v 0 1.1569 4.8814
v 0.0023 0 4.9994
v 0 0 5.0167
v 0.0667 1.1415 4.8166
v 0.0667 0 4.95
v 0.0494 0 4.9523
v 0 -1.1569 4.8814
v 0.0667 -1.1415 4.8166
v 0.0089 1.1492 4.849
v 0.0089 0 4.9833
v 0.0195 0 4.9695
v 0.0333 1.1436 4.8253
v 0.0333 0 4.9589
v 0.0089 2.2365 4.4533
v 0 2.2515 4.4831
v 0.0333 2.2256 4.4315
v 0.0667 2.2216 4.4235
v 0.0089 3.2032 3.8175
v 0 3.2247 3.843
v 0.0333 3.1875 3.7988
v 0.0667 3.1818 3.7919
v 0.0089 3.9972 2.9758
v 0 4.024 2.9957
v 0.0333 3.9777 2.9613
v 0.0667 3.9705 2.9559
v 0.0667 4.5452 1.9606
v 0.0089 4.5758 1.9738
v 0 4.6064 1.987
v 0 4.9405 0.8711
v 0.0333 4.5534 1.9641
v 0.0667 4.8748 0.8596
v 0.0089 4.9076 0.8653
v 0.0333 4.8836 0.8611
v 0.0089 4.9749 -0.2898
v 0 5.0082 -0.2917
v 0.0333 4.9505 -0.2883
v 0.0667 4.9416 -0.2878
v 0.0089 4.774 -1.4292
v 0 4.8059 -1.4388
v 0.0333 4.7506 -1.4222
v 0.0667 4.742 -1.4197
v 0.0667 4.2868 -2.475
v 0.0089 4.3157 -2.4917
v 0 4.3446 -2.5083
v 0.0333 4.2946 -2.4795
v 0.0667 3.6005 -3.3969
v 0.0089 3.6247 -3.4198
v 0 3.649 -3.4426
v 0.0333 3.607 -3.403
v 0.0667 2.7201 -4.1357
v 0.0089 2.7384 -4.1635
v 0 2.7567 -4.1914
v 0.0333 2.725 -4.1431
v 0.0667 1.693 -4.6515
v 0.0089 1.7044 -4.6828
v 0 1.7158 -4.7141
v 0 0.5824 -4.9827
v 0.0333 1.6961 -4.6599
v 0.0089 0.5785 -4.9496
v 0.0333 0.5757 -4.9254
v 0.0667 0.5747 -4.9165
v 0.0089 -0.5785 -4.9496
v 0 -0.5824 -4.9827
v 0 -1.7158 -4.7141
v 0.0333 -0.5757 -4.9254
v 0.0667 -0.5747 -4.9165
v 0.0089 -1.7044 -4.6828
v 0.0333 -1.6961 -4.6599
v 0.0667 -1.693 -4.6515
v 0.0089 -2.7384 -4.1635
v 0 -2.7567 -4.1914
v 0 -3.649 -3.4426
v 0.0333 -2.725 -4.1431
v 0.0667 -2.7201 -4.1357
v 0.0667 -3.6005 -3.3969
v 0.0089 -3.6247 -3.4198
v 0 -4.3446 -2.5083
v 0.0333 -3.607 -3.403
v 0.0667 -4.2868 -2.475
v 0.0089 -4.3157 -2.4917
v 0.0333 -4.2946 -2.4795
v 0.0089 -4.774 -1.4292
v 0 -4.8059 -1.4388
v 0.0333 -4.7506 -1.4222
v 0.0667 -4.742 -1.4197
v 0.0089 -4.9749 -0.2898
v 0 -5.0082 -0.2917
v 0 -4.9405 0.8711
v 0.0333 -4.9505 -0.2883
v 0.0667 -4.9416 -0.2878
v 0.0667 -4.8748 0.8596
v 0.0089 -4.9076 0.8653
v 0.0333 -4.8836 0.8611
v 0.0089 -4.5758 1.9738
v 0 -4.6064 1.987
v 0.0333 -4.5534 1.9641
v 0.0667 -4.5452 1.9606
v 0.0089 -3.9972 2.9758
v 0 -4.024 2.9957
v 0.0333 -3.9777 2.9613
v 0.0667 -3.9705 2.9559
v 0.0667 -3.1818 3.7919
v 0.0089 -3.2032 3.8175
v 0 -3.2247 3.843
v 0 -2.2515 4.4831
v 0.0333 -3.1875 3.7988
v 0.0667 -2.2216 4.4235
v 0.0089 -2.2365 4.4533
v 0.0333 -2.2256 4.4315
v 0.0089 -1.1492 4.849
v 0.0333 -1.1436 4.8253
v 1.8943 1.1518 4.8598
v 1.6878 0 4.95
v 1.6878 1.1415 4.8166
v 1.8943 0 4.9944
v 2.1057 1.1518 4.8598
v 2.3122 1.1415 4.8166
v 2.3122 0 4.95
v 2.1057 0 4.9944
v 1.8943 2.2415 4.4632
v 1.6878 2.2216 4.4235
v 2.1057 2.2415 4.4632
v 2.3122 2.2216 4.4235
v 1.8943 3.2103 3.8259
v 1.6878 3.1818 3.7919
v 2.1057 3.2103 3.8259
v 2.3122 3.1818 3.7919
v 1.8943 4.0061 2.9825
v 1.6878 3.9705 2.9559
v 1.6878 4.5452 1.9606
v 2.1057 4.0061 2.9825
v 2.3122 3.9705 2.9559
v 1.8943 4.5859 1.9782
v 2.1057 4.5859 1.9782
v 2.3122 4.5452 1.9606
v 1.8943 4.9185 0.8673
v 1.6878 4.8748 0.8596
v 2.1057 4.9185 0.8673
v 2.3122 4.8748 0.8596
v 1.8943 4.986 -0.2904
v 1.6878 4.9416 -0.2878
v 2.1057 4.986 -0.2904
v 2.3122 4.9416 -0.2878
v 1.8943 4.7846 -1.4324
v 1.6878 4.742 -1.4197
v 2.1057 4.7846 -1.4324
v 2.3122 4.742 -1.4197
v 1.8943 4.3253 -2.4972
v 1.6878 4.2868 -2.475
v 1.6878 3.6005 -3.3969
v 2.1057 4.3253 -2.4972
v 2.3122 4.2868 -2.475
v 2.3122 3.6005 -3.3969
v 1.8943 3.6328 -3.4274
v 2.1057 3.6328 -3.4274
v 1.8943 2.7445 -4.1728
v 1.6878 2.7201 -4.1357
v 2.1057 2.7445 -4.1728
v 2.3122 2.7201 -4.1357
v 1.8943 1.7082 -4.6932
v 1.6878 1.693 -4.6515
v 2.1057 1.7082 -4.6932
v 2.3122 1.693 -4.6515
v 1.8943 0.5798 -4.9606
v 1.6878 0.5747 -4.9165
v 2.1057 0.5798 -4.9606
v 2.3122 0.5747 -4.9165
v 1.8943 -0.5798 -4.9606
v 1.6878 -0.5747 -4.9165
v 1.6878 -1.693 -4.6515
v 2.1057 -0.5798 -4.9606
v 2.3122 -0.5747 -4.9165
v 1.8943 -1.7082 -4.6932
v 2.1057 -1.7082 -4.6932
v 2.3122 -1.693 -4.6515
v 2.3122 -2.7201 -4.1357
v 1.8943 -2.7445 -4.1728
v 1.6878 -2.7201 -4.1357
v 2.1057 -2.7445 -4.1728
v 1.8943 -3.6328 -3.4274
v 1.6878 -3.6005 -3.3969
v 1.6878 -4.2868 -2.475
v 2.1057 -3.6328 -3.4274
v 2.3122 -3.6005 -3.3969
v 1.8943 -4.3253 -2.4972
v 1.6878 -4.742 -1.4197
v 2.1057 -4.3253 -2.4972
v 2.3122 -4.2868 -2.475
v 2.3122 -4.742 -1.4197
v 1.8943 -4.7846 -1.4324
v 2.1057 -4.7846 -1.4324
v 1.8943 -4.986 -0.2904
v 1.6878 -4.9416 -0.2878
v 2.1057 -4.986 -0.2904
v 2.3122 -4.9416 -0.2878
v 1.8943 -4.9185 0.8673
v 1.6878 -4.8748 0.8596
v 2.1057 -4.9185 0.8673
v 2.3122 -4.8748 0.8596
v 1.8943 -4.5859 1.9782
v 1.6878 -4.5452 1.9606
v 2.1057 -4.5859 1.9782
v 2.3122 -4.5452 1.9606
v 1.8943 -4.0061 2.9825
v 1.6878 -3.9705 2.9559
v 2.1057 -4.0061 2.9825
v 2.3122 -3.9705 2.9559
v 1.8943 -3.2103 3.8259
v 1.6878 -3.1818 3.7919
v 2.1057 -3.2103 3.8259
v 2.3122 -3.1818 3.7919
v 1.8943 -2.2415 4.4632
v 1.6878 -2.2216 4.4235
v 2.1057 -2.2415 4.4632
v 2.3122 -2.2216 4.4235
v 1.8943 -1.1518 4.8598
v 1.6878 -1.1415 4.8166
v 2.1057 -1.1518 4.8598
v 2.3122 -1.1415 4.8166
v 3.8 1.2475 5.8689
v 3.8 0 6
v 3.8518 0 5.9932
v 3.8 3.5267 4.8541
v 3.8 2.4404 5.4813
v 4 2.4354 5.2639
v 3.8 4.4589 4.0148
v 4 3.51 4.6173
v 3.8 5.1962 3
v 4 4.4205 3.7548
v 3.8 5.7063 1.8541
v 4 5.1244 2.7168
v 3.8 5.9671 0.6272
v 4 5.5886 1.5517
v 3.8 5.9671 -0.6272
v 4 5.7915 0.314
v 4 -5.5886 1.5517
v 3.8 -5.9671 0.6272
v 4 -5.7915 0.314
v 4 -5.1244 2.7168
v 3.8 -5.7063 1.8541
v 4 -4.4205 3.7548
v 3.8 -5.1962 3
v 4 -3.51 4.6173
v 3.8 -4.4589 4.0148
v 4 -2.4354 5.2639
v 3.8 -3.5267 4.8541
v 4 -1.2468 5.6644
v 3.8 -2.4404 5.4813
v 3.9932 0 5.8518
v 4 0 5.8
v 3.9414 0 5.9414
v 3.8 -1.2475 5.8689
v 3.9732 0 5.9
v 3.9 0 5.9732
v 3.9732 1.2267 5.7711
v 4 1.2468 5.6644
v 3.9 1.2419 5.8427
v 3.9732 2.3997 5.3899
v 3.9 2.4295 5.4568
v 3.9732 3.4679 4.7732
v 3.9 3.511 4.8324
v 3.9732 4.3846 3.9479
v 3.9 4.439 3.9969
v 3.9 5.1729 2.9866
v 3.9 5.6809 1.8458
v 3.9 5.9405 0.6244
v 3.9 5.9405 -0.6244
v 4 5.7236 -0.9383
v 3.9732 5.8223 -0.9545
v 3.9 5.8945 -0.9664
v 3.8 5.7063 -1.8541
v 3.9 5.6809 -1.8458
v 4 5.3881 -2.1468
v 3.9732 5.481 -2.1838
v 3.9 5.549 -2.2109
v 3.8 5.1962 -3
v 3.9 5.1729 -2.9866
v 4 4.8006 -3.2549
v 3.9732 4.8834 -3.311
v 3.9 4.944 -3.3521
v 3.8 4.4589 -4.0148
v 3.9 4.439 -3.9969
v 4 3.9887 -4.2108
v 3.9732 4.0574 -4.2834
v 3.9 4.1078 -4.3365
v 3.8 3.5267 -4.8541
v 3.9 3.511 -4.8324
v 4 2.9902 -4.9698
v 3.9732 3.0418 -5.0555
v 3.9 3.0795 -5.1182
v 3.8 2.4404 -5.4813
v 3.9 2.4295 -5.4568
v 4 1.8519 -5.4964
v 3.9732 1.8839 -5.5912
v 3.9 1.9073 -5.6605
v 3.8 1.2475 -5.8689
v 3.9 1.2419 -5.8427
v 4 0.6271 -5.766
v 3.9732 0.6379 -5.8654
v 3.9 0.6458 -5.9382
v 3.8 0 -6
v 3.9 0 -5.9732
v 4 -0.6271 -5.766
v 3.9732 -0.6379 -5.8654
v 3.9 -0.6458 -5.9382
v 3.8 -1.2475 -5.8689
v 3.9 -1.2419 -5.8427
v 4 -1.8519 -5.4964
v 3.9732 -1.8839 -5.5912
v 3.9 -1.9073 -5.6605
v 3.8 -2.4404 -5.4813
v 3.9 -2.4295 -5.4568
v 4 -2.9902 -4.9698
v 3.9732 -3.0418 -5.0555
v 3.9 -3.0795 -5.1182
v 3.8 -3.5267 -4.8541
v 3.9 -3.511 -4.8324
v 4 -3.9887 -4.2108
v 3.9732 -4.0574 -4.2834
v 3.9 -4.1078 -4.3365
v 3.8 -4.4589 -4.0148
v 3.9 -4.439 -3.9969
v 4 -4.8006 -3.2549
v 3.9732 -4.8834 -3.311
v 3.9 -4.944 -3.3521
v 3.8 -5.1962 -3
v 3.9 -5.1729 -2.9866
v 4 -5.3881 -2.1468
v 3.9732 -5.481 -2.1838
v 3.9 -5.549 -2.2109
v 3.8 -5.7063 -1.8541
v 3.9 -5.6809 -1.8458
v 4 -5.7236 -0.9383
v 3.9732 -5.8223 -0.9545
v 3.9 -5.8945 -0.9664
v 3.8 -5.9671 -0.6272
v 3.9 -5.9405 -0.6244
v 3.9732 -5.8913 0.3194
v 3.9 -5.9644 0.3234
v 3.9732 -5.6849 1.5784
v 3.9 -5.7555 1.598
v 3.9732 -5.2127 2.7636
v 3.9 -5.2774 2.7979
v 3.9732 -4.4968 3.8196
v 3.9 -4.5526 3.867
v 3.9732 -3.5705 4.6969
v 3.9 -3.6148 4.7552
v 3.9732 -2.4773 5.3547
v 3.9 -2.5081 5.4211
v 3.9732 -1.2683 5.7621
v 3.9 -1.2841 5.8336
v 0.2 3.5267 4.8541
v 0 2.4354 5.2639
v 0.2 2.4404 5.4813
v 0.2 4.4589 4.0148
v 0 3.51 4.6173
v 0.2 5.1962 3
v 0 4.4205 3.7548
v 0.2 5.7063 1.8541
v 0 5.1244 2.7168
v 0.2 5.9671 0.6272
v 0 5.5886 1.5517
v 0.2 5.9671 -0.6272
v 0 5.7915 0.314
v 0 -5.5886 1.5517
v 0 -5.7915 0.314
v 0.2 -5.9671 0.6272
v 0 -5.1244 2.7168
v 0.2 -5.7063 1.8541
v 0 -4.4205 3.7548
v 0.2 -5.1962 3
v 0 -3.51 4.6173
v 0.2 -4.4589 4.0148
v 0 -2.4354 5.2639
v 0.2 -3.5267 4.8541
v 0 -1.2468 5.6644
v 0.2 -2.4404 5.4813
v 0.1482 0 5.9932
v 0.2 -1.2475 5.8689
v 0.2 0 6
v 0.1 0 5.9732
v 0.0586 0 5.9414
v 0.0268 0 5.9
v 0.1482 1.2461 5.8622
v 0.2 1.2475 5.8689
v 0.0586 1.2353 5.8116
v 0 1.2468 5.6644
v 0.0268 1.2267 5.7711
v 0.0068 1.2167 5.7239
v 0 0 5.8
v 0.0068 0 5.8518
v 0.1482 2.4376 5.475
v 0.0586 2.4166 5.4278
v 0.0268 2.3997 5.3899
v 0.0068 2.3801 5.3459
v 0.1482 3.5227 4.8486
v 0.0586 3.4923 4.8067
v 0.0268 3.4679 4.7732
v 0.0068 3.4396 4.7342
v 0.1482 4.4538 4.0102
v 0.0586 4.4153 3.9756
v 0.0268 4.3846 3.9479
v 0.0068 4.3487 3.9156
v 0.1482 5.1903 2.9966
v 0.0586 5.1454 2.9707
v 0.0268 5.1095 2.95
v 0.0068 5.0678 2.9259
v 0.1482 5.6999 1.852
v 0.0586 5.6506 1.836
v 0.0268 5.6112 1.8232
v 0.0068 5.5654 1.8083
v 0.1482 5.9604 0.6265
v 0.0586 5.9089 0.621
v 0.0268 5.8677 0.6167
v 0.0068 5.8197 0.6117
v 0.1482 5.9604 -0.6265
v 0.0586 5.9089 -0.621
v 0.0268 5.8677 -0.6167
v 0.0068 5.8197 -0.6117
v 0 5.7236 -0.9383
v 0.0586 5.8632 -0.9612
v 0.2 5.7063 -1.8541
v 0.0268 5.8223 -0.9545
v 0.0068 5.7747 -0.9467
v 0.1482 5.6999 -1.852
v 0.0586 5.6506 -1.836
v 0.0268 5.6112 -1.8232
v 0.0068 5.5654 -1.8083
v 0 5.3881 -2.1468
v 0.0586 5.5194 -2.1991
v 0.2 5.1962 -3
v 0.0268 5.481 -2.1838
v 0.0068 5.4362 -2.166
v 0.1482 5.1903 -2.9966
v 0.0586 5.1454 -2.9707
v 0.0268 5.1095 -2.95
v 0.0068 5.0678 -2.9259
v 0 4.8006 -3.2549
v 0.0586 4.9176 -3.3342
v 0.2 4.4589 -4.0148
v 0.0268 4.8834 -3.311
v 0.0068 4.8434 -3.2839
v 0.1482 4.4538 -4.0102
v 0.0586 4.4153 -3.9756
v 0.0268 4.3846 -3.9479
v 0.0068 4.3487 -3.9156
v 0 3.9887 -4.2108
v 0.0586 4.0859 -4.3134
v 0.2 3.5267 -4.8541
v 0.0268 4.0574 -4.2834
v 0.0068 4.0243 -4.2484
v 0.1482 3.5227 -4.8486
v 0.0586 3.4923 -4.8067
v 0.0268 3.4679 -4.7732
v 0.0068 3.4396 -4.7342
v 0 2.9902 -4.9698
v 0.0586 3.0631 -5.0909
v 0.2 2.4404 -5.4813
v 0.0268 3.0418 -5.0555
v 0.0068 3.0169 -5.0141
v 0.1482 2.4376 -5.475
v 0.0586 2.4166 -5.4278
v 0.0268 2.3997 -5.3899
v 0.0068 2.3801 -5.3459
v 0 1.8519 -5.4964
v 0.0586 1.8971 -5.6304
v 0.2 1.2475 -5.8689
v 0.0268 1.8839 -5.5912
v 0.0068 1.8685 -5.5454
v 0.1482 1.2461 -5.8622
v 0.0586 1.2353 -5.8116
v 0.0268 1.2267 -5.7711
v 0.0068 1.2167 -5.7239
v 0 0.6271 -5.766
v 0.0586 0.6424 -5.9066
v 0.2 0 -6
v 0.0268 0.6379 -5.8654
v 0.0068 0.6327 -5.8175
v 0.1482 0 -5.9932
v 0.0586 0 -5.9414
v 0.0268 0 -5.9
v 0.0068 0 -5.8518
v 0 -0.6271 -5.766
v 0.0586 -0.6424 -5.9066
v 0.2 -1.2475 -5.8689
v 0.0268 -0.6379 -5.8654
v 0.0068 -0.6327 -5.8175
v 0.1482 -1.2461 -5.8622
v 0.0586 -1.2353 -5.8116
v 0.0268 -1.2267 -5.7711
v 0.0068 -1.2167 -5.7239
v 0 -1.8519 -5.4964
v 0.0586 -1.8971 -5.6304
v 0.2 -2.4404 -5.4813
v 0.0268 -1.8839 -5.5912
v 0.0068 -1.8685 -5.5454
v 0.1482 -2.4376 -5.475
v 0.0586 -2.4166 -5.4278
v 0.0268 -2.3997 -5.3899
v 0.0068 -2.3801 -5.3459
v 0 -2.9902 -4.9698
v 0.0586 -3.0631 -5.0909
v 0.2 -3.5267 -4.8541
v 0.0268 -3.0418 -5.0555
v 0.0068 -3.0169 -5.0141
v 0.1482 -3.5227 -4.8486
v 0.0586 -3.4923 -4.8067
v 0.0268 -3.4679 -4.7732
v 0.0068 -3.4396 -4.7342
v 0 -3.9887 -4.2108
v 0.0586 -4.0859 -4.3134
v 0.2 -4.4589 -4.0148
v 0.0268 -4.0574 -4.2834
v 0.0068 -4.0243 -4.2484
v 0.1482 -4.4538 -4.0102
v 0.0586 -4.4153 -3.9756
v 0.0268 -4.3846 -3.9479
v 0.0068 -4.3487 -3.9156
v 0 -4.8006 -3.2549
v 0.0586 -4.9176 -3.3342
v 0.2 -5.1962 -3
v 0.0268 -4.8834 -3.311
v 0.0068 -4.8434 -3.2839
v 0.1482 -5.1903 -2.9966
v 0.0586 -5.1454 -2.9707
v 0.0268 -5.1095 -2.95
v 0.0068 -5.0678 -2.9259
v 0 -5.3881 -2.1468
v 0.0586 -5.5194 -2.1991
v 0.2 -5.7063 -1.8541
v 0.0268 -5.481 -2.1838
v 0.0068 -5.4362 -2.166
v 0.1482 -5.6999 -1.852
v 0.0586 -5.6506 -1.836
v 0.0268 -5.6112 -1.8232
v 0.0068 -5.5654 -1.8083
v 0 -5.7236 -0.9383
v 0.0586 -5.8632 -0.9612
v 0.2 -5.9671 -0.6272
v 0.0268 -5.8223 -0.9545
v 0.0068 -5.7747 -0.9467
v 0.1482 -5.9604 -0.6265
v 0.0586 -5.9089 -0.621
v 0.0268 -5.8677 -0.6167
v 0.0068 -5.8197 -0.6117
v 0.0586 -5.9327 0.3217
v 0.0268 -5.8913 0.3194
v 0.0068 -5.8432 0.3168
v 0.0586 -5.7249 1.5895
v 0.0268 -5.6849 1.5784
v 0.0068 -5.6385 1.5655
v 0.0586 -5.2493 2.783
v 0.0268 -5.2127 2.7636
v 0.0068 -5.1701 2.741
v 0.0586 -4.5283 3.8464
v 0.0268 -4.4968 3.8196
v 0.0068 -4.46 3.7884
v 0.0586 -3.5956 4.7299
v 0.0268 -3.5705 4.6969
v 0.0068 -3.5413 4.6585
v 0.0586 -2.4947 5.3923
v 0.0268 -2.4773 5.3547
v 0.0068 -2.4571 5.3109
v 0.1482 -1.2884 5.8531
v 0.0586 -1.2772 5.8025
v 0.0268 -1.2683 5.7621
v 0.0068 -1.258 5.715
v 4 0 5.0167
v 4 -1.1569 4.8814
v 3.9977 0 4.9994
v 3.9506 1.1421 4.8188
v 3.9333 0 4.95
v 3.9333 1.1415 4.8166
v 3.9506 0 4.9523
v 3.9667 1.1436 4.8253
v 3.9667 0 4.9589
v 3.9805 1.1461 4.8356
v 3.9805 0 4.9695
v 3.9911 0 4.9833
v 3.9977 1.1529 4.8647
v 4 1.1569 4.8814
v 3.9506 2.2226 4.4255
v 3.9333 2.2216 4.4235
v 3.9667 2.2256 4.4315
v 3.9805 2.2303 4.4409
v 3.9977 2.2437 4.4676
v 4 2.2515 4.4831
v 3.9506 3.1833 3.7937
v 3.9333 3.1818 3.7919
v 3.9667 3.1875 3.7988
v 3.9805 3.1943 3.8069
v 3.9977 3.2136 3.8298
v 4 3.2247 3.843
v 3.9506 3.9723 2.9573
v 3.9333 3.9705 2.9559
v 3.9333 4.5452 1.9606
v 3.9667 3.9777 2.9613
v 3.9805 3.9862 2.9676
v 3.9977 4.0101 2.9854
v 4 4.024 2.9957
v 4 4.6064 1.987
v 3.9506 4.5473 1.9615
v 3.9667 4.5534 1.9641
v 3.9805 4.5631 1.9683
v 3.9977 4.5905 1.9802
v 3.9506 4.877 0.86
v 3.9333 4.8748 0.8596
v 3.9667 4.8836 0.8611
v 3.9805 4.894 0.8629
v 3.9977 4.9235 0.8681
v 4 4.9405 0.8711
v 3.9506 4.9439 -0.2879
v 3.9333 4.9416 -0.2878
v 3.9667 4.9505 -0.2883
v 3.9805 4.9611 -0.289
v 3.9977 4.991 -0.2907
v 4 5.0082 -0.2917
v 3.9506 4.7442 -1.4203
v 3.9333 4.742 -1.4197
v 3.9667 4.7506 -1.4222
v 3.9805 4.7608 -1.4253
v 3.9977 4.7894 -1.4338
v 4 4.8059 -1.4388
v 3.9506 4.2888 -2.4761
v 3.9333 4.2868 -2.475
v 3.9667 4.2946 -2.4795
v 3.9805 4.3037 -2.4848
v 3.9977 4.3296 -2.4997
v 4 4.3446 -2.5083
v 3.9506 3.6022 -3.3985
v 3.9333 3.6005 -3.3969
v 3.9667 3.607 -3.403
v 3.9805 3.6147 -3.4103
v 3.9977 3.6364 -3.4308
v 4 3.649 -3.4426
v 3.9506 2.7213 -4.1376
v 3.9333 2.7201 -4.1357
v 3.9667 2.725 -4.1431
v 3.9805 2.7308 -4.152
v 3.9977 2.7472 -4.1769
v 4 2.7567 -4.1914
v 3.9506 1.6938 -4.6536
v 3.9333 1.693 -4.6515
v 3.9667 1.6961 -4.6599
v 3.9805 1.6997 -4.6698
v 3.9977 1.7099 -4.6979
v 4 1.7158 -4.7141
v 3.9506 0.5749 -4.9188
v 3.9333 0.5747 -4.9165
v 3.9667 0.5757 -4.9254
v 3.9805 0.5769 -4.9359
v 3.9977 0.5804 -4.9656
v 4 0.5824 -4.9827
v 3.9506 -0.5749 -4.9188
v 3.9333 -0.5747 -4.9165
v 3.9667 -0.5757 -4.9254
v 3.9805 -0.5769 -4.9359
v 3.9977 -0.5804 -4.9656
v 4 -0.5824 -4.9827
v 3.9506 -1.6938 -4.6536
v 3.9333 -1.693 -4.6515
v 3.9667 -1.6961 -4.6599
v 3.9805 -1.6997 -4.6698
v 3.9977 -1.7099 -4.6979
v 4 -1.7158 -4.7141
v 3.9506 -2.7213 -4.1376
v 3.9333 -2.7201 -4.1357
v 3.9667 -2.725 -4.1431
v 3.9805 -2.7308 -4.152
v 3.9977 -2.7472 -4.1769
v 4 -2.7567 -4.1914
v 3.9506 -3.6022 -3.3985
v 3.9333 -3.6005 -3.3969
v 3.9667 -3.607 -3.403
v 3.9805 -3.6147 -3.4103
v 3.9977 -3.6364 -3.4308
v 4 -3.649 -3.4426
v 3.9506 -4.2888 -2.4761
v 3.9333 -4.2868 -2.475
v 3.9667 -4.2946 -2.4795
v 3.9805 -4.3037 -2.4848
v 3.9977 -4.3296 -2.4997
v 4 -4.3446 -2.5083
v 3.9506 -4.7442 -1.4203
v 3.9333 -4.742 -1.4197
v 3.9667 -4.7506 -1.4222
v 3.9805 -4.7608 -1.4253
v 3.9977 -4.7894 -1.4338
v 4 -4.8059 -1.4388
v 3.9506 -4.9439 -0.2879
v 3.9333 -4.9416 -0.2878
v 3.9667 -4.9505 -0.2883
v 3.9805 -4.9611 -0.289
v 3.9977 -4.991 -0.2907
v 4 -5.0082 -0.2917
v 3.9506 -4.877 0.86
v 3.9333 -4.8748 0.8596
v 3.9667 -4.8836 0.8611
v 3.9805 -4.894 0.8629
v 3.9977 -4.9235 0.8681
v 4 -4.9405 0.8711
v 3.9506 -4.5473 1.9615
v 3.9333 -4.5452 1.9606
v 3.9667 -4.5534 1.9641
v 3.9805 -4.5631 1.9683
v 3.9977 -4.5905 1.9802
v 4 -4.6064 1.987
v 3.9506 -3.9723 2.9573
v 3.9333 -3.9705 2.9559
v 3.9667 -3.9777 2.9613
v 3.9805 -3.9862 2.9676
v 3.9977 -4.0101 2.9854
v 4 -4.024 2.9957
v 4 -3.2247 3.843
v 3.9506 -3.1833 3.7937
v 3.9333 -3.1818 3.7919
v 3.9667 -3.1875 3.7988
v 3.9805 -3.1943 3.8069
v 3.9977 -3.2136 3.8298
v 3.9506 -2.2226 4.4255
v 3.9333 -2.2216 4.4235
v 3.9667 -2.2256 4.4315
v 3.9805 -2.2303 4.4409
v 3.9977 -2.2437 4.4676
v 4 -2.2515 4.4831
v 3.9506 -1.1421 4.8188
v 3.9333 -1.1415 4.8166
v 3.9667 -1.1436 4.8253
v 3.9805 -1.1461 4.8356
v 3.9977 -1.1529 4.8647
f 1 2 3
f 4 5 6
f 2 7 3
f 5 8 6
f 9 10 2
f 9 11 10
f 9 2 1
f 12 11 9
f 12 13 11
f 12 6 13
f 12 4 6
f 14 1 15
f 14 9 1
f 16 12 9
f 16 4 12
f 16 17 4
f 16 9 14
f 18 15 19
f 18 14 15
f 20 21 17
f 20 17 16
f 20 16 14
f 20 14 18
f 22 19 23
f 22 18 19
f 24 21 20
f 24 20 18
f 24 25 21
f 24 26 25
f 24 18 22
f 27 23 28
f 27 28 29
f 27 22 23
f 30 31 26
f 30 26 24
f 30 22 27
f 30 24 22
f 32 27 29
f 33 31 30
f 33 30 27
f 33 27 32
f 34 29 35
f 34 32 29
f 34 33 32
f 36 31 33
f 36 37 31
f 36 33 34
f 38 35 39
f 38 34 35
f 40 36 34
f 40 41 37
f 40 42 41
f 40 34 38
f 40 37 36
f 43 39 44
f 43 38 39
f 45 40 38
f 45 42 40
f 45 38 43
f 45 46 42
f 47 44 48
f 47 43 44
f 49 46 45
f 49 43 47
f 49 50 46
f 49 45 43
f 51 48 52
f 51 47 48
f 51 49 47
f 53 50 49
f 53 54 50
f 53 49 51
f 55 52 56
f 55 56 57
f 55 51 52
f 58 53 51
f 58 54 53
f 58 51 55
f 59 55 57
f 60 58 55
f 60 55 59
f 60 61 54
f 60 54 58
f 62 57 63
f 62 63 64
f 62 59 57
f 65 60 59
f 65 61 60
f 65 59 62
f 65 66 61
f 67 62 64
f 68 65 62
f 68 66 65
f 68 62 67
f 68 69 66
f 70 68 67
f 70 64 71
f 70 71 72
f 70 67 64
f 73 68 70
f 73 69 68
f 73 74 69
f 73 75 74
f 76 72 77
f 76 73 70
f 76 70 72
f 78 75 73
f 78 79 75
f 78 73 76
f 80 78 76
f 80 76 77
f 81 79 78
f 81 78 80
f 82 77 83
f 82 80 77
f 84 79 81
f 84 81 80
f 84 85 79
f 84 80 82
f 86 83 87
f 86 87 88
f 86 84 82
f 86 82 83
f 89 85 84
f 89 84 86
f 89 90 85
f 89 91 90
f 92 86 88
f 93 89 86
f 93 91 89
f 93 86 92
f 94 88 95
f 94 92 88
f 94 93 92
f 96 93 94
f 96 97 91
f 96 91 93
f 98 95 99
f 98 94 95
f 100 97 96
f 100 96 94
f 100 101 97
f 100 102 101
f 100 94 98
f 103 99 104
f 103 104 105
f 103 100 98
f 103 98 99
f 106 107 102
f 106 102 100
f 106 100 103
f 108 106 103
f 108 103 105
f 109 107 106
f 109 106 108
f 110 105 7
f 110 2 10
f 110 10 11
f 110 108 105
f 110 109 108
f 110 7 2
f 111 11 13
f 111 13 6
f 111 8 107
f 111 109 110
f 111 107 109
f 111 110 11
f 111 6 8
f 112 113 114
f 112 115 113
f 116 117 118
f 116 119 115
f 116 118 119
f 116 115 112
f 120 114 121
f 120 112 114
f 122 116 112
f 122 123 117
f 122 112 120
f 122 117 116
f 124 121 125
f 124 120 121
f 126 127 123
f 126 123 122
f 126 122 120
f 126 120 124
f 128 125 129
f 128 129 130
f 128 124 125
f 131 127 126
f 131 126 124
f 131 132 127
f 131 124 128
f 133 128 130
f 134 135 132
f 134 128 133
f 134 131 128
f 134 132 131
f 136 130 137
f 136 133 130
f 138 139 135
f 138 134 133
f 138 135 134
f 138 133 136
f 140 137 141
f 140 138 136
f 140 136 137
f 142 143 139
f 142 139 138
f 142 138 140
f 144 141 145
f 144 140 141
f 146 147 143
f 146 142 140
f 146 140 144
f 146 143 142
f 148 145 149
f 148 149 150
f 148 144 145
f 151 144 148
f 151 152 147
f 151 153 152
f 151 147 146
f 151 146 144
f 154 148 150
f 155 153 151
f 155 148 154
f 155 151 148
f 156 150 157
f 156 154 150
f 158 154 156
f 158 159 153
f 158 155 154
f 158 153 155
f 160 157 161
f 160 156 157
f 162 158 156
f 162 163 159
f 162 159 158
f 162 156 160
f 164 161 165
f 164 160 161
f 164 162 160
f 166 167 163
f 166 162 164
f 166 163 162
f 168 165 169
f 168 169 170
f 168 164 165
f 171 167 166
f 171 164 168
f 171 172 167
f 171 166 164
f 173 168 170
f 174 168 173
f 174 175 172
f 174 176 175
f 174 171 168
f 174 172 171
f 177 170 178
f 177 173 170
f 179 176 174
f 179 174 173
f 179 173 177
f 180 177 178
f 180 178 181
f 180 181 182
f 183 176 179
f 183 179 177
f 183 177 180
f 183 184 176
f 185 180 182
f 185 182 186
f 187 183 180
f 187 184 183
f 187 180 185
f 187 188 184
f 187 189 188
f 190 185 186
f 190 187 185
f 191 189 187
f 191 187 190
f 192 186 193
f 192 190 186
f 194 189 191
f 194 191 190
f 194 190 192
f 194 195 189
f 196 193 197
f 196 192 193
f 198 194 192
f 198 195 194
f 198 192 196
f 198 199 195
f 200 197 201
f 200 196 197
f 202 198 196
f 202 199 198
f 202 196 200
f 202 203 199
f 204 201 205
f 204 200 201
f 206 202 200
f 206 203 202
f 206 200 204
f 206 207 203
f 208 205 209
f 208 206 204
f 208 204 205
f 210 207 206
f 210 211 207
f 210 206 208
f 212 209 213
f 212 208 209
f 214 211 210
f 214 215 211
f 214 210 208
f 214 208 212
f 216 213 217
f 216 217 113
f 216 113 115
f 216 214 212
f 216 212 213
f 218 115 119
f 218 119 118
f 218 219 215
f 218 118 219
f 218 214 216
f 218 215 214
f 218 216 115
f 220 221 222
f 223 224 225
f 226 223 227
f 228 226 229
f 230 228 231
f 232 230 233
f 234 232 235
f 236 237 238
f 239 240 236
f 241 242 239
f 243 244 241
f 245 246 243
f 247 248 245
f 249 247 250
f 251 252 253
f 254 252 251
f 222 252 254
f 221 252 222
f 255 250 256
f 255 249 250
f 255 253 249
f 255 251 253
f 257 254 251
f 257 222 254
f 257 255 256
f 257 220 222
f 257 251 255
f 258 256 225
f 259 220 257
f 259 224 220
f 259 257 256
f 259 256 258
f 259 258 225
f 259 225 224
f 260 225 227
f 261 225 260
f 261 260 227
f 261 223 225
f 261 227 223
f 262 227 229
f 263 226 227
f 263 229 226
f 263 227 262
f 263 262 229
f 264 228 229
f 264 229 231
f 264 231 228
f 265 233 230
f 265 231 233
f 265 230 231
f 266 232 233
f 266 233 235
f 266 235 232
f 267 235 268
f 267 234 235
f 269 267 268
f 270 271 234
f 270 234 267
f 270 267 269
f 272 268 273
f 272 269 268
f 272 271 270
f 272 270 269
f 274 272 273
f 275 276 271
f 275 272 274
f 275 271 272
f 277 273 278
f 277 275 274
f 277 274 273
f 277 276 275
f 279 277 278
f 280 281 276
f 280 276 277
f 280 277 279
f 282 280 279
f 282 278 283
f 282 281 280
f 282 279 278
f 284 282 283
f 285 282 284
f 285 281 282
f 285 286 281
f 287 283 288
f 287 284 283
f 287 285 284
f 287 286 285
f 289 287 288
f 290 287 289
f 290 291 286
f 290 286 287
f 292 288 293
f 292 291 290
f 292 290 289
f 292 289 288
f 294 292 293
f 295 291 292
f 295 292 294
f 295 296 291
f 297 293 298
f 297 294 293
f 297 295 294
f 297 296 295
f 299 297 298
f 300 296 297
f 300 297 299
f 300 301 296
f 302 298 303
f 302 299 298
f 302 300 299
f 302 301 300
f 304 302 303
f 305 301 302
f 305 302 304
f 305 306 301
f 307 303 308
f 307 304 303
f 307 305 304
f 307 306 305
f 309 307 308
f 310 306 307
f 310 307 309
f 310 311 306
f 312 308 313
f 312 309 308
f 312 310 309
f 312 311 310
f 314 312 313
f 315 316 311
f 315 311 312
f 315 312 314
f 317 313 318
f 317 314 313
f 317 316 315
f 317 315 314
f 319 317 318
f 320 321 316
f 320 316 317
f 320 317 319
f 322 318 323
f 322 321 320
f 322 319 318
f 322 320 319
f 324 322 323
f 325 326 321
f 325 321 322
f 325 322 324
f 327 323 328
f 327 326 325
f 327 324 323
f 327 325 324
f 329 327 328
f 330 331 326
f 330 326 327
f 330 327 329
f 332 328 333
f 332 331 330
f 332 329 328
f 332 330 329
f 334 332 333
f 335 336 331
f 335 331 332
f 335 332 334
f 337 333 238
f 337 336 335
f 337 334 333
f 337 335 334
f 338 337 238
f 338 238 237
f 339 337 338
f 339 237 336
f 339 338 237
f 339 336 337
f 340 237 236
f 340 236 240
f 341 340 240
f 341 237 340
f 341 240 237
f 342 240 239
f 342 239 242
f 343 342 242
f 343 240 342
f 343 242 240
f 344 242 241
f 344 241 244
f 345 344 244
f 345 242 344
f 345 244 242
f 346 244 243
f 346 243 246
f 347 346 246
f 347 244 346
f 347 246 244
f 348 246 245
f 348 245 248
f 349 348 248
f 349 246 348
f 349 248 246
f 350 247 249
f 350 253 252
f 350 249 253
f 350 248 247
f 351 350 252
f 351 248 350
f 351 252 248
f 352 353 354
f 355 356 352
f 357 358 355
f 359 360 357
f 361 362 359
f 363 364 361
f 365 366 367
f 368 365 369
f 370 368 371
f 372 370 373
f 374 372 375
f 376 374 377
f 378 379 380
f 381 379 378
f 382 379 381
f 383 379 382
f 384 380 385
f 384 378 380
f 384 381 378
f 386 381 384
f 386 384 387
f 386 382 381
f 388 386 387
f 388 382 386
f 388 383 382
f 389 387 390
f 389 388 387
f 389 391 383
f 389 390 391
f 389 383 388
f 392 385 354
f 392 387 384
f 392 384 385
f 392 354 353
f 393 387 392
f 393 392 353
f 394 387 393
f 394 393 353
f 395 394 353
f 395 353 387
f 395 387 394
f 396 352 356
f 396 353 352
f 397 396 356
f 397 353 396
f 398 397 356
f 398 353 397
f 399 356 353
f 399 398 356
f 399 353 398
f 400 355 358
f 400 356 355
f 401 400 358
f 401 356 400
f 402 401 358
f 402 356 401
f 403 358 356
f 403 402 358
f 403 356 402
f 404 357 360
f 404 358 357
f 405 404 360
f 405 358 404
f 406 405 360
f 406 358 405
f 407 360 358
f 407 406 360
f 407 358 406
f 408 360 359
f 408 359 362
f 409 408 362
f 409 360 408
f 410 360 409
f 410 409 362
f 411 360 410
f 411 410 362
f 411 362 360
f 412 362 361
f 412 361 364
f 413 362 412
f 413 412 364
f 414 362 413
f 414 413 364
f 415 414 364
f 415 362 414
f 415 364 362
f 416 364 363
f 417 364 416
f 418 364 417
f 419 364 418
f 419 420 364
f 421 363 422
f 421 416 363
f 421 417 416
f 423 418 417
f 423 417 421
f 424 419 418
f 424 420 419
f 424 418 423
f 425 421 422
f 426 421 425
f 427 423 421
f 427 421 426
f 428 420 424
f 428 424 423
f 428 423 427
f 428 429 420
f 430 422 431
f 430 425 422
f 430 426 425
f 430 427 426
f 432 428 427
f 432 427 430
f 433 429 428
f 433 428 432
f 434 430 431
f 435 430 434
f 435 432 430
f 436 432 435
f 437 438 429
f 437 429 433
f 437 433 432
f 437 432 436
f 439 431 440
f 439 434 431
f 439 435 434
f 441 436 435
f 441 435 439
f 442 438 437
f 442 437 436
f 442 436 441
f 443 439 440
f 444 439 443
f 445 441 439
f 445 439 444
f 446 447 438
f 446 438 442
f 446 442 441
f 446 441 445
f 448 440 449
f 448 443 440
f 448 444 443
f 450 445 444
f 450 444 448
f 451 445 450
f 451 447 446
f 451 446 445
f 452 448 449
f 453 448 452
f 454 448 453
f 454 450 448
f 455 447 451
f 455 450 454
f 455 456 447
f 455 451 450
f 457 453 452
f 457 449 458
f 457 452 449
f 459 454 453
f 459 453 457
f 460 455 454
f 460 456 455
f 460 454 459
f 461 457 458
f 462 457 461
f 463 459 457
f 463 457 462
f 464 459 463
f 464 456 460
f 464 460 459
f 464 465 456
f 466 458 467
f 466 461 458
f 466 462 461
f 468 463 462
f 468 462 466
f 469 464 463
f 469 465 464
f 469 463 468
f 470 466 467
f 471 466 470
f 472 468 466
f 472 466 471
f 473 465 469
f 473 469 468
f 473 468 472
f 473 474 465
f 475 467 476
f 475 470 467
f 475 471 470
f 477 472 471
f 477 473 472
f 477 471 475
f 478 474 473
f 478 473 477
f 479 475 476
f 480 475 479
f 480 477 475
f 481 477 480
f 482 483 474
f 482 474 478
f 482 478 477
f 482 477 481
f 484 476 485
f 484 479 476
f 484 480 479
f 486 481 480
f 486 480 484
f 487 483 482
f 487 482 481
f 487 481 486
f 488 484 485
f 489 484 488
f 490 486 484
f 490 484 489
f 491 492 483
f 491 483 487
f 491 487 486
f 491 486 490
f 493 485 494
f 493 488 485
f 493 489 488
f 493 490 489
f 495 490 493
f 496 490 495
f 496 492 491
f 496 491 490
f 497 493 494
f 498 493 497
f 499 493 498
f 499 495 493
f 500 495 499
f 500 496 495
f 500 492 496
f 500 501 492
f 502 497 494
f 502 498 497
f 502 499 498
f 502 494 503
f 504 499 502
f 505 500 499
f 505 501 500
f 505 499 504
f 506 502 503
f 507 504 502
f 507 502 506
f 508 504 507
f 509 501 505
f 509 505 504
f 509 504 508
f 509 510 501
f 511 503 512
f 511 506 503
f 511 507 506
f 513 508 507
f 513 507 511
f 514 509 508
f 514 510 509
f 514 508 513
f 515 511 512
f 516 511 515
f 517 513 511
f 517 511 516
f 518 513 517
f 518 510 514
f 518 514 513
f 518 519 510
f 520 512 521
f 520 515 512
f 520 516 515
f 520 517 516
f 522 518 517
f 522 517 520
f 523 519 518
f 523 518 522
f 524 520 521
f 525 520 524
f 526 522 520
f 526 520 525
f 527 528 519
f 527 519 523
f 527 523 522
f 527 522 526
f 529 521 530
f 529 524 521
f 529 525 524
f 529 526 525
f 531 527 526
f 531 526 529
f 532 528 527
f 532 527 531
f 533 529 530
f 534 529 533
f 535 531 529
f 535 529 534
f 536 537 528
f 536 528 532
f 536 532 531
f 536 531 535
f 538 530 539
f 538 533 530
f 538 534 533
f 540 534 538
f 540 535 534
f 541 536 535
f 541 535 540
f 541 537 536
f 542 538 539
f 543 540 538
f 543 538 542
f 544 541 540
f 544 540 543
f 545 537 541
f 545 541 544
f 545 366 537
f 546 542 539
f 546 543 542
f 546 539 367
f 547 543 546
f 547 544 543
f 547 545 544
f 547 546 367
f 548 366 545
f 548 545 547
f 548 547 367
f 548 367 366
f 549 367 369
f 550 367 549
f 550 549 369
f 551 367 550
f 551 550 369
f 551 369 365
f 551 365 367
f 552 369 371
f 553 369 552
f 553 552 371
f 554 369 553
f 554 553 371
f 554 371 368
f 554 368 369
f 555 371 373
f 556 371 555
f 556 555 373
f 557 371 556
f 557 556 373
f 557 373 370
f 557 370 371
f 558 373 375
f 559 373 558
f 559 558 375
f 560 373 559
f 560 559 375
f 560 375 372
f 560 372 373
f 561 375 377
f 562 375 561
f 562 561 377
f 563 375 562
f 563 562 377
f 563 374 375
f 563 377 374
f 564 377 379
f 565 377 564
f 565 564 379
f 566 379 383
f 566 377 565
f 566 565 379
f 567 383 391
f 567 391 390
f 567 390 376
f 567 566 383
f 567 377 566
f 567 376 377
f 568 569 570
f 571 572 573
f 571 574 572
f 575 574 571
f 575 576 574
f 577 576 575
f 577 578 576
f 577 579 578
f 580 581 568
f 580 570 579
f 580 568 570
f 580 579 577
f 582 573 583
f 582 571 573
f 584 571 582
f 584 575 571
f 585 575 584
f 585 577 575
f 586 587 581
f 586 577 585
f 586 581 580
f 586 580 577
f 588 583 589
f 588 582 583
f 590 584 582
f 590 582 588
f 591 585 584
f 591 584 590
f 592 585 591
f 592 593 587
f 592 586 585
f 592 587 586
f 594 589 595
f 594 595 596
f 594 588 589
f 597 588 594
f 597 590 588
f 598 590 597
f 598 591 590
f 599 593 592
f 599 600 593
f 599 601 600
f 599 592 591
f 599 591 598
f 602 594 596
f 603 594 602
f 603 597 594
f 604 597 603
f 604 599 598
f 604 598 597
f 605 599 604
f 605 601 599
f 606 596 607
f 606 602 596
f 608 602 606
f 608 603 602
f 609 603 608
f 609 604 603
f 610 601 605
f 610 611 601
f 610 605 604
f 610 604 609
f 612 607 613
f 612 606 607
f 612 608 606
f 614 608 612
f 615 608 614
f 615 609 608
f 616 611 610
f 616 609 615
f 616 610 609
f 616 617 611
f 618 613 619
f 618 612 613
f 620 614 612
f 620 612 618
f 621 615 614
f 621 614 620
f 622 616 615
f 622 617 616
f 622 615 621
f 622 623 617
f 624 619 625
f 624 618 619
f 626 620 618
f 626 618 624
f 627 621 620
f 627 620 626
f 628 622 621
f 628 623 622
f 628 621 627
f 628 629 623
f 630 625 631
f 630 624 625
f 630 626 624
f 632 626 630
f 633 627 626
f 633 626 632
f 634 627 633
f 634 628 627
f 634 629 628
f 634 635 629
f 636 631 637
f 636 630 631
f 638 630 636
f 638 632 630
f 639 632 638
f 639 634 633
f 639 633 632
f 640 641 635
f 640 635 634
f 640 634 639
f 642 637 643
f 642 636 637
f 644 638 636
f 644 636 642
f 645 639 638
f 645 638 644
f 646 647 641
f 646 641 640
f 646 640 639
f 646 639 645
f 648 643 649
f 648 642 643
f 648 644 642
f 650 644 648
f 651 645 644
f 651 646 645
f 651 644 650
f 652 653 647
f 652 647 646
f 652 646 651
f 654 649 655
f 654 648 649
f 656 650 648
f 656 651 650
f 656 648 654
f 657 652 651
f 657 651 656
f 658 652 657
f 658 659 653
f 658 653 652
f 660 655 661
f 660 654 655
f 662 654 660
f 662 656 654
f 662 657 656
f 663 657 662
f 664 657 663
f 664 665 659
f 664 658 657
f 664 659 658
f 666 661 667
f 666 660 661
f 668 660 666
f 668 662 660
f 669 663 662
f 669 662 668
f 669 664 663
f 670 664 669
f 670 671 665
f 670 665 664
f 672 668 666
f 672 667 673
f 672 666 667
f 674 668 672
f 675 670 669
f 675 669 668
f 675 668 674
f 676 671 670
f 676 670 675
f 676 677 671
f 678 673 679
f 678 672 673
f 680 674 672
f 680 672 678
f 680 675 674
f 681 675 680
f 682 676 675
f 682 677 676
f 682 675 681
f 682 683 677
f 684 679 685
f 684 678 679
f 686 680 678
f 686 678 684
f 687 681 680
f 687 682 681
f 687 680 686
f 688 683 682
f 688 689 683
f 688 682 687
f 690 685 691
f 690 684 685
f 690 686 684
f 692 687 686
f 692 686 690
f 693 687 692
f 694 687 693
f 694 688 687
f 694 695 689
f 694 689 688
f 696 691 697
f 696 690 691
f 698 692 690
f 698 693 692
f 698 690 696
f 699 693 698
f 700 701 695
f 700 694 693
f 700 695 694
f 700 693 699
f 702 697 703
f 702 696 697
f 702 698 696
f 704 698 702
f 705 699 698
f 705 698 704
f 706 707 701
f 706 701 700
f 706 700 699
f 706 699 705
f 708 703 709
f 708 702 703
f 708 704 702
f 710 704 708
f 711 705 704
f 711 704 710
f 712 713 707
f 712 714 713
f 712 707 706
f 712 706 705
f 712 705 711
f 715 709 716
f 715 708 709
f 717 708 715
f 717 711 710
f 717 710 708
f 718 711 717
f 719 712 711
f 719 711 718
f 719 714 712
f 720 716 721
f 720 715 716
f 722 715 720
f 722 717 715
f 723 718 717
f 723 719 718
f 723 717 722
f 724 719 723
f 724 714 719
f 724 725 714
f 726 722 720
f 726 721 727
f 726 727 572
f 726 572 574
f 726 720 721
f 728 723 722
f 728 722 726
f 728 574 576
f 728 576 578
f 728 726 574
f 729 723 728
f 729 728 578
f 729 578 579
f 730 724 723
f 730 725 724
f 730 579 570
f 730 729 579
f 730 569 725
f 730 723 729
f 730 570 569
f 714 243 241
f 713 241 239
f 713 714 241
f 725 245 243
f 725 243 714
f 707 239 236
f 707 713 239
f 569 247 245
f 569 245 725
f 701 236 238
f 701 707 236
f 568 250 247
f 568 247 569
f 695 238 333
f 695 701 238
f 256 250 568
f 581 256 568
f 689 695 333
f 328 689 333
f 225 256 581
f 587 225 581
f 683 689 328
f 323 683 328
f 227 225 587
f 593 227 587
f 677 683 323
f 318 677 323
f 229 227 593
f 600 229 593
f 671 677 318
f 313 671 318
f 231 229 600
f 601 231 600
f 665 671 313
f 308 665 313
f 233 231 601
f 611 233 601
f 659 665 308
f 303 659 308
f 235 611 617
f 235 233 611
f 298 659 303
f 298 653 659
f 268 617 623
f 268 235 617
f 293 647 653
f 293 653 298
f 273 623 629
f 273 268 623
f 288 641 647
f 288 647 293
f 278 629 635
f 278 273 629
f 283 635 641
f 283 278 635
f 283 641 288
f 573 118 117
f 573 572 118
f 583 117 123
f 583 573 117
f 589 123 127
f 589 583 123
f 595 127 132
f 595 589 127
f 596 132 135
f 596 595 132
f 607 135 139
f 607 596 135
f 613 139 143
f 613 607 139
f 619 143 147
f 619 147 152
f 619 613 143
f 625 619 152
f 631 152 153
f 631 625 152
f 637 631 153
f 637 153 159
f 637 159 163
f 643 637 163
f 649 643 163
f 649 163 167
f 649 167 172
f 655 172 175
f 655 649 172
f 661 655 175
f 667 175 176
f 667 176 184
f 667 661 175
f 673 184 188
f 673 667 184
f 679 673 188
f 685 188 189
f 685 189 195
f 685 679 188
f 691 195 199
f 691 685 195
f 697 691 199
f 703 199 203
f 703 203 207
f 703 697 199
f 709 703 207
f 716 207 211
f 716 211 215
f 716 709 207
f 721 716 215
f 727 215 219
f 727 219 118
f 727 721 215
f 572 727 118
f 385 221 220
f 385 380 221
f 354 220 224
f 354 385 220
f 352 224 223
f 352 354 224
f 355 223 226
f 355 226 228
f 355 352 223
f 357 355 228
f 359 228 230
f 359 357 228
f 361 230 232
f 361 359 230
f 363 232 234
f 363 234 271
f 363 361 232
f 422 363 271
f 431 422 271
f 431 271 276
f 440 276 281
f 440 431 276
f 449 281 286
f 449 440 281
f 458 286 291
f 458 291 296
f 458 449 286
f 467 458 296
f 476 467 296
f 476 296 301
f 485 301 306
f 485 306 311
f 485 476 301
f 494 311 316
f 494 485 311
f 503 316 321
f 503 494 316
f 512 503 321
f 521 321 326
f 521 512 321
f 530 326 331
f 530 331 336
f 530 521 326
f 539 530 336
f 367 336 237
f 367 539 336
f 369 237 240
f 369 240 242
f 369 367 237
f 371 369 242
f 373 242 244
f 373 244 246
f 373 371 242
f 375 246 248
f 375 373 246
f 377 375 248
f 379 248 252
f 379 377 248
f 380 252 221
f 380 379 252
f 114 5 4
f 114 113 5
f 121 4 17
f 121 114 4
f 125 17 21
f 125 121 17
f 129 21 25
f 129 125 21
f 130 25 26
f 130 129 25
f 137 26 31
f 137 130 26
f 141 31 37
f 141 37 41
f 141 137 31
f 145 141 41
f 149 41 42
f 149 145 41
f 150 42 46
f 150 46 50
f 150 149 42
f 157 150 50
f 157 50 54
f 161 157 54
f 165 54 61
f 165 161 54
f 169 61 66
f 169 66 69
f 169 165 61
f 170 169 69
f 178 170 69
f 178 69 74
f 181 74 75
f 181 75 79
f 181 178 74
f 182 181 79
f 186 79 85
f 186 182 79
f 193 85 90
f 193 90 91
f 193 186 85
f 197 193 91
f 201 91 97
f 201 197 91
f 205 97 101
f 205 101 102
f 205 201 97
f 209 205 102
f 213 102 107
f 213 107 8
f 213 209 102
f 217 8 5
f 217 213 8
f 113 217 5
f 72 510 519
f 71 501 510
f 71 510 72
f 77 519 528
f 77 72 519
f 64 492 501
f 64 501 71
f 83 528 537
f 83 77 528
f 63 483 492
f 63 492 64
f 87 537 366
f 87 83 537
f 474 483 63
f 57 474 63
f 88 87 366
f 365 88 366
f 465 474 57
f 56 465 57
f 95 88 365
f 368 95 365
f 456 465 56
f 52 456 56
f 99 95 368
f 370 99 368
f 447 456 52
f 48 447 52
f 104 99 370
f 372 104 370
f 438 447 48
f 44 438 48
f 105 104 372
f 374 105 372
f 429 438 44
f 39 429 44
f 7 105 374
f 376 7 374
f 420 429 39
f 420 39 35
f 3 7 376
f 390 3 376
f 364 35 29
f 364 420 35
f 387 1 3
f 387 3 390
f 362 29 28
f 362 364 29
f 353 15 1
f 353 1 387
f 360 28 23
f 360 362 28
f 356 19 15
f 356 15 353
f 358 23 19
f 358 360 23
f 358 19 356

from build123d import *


with BuildPart() as part:
    # Sketch1 → Revolve1 (revolve)
    with BuildSketch(Plane.XY, mode=Mode.PRIVATE) as revolve1_sk:
        with BuildLine():
            Line((0.066666667, 4.95), (1.6877501, 4.95))
            ThreePointArc((1.6877501, 4.95), (2, 5), (2.3122499, 4.95))
            Line((2.3122499, 4.95), (3.933333333, 4.95))
            ThreePointArc((3.933333333, 4.95), (3.980473785, 4.969526215), (4, 5.016666667))
            Line((4, 5.016666667), (4, 5.8))
            ThreePointArc((4, 5.8), (3.941421356, 5.941421356), (3.8, 6))
            Line((3.8, 6), (0.2, 6))
            ThreePointArc((0.2, 6), (0.058578644, 5.941421356), (0, 5.8))
            Line((0, 5.8), (0, 5.016666667))
            ThreePointArc((0, 5.016666667), (0.019526215, 4.969526215), (0.066666667, 4.95))
        make_face()
    revolve(revolve1_sk.sketch.rotate(Axis((4, 0, 0), (-1, 0, 0)), 270), axis=Axis((4, 0, 0), (-1, 0, 0)))


solid = part.part
